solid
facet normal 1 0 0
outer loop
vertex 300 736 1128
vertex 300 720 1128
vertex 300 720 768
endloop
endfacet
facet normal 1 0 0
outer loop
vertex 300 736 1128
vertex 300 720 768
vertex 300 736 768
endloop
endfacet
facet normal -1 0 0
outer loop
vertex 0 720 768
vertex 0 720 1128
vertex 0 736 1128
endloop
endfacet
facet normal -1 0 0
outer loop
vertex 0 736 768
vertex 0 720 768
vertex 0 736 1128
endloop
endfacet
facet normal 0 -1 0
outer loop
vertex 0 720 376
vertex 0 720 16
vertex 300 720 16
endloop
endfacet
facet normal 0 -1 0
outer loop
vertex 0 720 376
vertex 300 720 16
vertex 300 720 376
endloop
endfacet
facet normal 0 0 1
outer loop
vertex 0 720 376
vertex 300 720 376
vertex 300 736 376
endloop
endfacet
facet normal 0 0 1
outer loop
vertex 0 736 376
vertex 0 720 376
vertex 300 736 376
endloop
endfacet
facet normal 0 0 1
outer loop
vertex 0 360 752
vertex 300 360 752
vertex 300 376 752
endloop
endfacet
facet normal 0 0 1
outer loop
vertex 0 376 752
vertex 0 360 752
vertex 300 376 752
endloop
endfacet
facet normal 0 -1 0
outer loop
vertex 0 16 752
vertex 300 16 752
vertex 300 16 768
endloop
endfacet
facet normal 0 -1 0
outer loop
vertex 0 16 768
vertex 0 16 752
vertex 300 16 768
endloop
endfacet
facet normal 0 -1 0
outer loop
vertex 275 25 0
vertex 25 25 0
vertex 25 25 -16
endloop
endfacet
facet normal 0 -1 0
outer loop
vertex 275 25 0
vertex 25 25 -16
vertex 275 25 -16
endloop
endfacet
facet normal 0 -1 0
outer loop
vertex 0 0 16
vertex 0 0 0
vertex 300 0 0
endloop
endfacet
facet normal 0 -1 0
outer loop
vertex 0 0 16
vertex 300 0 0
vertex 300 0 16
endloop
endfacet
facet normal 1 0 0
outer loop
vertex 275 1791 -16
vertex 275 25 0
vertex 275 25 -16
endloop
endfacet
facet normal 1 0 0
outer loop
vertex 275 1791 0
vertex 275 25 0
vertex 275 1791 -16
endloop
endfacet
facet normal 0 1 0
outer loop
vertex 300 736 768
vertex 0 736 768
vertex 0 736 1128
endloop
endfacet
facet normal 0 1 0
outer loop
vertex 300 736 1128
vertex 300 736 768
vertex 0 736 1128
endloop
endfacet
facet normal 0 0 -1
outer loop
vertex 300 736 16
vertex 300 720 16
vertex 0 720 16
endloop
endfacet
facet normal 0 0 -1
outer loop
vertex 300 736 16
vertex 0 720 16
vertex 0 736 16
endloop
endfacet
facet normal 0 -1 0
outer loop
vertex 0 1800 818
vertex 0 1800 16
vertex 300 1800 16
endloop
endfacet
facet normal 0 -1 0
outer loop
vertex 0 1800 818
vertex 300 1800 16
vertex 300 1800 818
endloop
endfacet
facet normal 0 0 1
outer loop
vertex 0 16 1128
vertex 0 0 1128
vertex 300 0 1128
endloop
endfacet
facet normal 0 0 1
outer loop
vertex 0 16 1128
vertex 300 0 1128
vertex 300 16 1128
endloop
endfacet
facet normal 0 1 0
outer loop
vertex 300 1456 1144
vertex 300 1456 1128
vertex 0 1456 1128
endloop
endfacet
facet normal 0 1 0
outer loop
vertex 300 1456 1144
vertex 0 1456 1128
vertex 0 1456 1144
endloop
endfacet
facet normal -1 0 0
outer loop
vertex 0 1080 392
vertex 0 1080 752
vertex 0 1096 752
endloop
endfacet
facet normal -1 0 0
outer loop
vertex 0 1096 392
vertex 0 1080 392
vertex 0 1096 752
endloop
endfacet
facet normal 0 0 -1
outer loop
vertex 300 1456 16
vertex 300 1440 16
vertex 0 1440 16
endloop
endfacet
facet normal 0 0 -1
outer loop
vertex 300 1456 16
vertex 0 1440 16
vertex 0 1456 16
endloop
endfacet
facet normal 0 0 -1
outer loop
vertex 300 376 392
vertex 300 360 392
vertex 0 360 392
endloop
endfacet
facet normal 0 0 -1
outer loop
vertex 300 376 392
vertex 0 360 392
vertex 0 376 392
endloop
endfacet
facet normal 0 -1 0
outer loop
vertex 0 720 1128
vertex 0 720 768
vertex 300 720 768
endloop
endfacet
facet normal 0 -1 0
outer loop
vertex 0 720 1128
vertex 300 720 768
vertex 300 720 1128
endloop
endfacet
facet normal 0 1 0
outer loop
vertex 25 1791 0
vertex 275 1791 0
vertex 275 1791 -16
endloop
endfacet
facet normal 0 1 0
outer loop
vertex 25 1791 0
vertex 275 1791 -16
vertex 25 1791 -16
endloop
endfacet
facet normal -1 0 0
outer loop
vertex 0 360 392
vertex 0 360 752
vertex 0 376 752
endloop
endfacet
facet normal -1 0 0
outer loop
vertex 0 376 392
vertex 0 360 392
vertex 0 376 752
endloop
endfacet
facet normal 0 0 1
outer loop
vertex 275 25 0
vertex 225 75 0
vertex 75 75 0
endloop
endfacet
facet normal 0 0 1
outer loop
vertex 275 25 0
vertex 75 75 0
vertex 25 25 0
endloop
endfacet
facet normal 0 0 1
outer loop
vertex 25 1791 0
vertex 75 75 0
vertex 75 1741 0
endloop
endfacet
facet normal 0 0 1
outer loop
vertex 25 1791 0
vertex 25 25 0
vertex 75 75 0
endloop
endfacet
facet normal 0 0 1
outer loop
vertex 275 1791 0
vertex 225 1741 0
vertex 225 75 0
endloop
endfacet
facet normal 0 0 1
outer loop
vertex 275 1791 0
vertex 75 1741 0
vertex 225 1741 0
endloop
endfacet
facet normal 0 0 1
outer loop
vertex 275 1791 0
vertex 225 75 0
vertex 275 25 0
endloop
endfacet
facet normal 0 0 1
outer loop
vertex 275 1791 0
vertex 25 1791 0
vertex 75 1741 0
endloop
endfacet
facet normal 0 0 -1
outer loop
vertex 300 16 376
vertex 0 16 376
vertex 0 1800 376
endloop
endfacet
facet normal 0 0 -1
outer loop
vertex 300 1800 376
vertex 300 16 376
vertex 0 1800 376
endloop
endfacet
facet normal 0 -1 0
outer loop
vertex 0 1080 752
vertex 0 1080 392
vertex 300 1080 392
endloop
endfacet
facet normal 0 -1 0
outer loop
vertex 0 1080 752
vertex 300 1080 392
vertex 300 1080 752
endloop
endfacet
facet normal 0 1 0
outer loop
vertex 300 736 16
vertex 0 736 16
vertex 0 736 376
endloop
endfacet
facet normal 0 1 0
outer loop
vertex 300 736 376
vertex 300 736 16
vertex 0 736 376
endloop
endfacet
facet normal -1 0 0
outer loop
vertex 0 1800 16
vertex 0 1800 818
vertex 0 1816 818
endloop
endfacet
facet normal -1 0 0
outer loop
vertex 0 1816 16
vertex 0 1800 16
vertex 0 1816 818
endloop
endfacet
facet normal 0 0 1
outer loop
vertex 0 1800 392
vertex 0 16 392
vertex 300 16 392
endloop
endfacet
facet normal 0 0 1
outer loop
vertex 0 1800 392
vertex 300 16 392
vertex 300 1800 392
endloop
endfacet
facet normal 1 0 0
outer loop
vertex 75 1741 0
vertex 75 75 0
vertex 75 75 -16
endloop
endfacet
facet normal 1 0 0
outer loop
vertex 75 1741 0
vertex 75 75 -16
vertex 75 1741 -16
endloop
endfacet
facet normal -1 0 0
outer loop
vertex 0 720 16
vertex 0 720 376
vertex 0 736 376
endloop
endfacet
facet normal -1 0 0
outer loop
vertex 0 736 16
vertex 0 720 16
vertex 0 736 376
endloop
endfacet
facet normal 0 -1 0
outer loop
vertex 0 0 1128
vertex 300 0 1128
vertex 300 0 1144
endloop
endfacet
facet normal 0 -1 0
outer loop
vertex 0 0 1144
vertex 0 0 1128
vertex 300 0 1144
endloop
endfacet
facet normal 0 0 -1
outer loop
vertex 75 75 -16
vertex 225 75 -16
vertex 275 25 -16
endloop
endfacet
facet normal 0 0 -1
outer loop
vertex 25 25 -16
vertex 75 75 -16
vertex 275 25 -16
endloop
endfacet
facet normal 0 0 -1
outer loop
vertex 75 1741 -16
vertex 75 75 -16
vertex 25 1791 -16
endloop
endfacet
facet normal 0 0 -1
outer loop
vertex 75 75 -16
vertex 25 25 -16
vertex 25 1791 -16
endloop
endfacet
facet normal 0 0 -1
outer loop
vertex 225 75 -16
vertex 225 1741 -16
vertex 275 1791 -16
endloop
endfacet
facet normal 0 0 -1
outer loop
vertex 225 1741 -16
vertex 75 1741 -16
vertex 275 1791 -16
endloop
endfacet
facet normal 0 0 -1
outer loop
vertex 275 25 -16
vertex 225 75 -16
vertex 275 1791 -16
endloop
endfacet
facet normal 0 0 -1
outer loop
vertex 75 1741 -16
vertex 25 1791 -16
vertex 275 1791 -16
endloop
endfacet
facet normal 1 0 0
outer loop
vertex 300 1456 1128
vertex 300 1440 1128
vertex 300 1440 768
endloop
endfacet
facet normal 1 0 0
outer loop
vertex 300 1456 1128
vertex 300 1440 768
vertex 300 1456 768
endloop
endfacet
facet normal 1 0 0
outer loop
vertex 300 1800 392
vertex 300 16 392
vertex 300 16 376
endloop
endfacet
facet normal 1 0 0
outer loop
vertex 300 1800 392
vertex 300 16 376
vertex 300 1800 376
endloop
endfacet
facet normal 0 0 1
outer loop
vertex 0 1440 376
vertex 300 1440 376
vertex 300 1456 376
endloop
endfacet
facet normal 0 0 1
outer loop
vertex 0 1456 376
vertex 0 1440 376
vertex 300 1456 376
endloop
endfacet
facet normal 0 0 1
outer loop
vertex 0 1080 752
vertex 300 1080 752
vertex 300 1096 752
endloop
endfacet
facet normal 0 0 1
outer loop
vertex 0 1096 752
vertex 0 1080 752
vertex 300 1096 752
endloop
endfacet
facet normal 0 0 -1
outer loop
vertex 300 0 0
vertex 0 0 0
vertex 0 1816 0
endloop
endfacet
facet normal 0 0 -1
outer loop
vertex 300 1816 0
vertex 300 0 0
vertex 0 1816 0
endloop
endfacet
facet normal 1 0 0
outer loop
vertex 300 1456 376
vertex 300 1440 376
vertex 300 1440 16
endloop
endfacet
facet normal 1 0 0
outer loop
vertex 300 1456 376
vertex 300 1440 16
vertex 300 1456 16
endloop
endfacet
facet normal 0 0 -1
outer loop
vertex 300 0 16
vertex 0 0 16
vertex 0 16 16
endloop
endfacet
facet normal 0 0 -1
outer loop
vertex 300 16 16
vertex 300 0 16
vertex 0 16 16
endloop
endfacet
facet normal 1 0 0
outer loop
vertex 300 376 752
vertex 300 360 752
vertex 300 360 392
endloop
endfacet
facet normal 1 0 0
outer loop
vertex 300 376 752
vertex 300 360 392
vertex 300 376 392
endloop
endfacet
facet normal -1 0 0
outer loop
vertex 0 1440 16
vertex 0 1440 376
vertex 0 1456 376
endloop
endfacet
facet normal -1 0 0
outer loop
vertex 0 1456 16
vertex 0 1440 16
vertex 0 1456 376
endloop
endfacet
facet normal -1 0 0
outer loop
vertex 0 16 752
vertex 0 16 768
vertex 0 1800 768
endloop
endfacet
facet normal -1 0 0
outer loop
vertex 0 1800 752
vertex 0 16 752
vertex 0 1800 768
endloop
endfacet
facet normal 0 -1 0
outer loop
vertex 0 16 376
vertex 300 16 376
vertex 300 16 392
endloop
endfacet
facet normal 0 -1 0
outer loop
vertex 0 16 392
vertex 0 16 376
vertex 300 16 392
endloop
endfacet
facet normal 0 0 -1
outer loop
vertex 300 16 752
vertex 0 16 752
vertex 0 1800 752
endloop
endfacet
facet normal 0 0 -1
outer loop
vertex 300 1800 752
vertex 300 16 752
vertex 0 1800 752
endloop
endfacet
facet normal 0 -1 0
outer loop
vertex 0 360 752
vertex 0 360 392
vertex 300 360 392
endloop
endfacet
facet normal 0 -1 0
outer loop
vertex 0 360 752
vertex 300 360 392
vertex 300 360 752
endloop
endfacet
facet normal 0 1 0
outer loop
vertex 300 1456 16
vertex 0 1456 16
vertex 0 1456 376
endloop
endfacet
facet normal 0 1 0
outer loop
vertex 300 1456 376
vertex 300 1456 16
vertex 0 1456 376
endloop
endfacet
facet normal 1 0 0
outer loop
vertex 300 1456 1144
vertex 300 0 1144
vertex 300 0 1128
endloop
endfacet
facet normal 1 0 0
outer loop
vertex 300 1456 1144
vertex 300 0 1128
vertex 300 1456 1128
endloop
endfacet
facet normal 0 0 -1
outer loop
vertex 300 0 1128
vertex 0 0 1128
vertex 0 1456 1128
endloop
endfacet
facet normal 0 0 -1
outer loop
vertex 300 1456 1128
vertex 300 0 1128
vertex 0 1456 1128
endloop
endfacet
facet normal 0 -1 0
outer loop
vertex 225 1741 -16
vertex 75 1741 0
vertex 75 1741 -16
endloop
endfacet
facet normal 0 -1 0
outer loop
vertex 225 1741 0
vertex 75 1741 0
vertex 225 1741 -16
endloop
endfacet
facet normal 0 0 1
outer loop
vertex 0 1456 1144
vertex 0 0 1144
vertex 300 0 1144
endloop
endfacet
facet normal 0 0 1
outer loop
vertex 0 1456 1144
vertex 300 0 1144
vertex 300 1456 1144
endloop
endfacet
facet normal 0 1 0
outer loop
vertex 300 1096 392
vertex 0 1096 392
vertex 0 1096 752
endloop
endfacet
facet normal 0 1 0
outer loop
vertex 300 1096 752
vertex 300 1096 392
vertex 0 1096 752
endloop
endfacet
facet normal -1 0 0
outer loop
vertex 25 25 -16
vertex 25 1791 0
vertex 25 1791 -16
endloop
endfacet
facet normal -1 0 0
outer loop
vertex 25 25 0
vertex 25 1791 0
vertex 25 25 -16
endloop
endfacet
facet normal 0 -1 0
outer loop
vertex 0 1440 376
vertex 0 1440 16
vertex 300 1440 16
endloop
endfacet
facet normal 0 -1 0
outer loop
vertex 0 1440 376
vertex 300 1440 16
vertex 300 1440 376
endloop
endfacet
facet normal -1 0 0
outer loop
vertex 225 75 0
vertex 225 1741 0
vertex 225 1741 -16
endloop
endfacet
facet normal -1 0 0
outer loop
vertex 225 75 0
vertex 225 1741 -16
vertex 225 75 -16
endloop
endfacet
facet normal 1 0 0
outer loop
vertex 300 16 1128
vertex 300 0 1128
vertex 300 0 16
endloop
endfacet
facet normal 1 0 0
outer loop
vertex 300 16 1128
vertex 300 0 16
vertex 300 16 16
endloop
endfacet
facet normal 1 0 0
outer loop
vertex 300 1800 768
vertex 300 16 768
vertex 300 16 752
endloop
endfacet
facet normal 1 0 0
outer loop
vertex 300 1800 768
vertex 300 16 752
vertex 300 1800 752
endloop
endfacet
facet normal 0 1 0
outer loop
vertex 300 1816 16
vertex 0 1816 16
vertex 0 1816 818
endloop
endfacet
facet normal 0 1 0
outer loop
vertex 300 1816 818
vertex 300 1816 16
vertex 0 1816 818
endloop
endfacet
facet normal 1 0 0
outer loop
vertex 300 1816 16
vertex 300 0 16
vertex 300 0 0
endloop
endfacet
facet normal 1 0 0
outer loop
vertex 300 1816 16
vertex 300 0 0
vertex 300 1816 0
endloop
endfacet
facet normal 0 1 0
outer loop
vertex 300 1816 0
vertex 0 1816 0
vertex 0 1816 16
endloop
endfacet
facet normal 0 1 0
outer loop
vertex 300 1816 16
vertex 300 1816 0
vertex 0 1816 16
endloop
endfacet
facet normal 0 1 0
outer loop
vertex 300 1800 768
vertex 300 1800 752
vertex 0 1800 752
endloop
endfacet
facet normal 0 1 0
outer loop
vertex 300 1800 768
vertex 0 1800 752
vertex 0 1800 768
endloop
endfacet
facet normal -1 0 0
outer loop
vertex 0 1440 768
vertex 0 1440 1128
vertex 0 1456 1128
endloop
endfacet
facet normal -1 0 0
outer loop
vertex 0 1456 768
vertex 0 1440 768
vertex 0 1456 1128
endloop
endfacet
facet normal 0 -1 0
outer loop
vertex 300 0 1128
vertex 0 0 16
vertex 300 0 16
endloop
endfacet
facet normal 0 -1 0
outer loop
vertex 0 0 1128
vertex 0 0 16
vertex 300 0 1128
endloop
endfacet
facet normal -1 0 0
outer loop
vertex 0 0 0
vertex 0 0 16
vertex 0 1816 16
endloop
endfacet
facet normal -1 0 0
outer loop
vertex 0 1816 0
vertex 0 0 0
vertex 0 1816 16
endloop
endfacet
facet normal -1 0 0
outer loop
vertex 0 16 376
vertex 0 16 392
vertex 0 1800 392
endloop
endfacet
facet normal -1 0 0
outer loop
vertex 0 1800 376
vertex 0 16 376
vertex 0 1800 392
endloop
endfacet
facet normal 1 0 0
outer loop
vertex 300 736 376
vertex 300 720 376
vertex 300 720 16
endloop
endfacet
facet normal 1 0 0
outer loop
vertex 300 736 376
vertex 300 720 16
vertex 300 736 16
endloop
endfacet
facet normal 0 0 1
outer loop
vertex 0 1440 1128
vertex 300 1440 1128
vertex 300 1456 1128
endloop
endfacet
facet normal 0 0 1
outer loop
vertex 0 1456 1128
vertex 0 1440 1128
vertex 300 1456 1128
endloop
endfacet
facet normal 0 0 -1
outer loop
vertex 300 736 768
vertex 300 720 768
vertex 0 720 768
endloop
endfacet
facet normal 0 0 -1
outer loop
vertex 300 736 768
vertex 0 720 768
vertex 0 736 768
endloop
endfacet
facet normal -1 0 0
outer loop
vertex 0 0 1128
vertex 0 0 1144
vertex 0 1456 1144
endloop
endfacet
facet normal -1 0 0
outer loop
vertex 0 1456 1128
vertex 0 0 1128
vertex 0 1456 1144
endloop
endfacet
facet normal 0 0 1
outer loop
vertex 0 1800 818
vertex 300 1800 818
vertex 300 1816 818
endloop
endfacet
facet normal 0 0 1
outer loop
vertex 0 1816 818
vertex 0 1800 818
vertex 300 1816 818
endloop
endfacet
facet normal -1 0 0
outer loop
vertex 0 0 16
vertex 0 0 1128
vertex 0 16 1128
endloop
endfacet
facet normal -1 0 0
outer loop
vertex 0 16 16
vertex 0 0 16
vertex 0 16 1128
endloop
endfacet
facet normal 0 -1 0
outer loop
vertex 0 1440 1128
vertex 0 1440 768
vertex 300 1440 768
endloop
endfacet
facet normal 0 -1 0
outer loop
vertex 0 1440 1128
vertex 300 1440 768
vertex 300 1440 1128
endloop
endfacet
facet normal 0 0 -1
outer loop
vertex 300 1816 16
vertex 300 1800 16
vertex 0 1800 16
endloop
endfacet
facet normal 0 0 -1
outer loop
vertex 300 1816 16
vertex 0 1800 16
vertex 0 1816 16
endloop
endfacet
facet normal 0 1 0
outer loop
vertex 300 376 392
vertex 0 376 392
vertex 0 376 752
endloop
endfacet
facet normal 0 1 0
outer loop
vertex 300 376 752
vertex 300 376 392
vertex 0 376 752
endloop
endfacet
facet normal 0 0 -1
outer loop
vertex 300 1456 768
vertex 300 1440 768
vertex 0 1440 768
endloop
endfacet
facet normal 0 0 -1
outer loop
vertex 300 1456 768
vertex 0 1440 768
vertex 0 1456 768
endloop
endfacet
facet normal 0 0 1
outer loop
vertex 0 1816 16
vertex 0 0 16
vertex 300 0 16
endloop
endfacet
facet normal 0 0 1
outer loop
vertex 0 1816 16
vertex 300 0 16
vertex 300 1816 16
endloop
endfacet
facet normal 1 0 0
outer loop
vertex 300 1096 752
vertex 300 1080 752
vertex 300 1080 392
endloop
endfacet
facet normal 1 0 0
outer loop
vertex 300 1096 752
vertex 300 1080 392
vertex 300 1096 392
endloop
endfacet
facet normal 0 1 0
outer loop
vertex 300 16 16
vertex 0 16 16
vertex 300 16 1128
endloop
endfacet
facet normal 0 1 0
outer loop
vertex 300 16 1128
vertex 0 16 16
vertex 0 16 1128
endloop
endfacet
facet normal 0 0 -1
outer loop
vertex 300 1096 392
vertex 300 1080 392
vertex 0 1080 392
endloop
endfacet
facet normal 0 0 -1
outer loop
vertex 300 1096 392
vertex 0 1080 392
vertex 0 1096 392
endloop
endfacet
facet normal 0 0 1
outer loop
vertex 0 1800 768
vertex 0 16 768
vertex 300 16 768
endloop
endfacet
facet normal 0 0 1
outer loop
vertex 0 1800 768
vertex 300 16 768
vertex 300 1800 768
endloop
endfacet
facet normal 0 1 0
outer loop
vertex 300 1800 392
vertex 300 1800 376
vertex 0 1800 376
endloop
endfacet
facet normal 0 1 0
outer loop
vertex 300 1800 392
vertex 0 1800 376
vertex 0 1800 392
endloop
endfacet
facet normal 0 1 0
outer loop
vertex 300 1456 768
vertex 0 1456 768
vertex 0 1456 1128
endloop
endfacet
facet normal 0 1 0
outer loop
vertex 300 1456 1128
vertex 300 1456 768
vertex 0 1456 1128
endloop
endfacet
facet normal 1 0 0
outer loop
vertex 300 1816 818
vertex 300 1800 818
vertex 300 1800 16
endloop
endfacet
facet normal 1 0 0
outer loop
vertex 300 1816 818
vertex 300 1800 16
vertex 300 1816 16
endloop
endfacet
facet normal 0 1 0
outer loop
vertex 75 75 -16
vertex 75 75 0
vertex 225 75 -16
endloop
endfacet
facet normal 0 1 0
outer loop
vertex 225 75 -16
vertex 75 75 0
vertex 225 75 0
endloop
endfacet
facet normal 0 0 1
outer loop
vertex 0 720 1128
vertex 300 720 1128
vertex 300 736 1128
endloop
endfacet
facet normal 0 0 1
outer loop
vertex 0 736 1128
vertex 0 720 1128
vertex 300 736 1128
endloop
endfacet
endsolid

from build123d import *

# Parameters (mm, degrees)
F2_W     = 1816
F2_H     = 16
F2_W_2   = 1784
F2_W_3   = 1456
F3_DEPTH = 300
F1_W     = 16
F1_H     = 802
F1_H_2   = 1112
F1_H_3   = 360
F4_DEPTH = 300
F5_W     = 150
F5_H     = 50
F6_DEPTH = 16


with BuildPart() as f3:
    # F2 (on Right) → F3 (new body)
    with BuildSketch(Plane.YZ):
        with Locations((908, 8)):
            Rectangle(F2_W, F2_H)
        with Locations((908, 384)):
            Rectangle(F2_W_2, F2_H)
        with Locations((908, 760)):
            Rectangle(F2_W_2, F2_H)
        with Locations((728, 1136)):
            Rectangle(F2_W_3, F2_H)
    extrude(amount=F3_DEPTH)


with BuildPart() as f4:
    # F1 (on Right) → F4 (new body)
    with BuildSketch(Plane.YZ):
        with Locations((1808, 417)):
            Rectangle(F1_W, F1_H)
        with Locations((8, 572)):
            Rectangle(F1_W, F1_H_2)
        with Locations((1448, 948)):
            Rectangle(F1_W, F1_H_3)
        with Locations((1088, 572)):
            Rectangle(F1_W, F1_H_3)
        with Locations((1448, 196)):
            Rectangle(F1_W, F1_H_3)
        with Locations((728, 196)):
            Rectangle(F1_W, F1_H_3)
        with Locations((368, 572)):
            Rectangle(F1_W, F1_H_3)
        with Locations((728, 948)):
            Rectangle(F1_W, F1_H_3)
    extrude(amount=F4_DEPTH)


with BuildPart() as f6:
    # F5 (on Top) → F6 (new body)
    with BuildSketch(Plane.XY):
        Polygon((25, 1791), (25, 25), (75, 25), (75, 75), (75, 1741), (75, 1791), align=None)
        with Locations((150, 50)):
            Rectangle(F5_W, F5_H)
        Polygon((225, 75), (225, 25), (275, 25), (275, 1791), (225, 1791), (225, 1741), align=None)
        with Locations((150, 1766)):
            Rectangle(F5_W, F5_H)
    extrude(amount=-F6_DEPTH)


solid = Compound([f3.part, f4.part, f6.part])
